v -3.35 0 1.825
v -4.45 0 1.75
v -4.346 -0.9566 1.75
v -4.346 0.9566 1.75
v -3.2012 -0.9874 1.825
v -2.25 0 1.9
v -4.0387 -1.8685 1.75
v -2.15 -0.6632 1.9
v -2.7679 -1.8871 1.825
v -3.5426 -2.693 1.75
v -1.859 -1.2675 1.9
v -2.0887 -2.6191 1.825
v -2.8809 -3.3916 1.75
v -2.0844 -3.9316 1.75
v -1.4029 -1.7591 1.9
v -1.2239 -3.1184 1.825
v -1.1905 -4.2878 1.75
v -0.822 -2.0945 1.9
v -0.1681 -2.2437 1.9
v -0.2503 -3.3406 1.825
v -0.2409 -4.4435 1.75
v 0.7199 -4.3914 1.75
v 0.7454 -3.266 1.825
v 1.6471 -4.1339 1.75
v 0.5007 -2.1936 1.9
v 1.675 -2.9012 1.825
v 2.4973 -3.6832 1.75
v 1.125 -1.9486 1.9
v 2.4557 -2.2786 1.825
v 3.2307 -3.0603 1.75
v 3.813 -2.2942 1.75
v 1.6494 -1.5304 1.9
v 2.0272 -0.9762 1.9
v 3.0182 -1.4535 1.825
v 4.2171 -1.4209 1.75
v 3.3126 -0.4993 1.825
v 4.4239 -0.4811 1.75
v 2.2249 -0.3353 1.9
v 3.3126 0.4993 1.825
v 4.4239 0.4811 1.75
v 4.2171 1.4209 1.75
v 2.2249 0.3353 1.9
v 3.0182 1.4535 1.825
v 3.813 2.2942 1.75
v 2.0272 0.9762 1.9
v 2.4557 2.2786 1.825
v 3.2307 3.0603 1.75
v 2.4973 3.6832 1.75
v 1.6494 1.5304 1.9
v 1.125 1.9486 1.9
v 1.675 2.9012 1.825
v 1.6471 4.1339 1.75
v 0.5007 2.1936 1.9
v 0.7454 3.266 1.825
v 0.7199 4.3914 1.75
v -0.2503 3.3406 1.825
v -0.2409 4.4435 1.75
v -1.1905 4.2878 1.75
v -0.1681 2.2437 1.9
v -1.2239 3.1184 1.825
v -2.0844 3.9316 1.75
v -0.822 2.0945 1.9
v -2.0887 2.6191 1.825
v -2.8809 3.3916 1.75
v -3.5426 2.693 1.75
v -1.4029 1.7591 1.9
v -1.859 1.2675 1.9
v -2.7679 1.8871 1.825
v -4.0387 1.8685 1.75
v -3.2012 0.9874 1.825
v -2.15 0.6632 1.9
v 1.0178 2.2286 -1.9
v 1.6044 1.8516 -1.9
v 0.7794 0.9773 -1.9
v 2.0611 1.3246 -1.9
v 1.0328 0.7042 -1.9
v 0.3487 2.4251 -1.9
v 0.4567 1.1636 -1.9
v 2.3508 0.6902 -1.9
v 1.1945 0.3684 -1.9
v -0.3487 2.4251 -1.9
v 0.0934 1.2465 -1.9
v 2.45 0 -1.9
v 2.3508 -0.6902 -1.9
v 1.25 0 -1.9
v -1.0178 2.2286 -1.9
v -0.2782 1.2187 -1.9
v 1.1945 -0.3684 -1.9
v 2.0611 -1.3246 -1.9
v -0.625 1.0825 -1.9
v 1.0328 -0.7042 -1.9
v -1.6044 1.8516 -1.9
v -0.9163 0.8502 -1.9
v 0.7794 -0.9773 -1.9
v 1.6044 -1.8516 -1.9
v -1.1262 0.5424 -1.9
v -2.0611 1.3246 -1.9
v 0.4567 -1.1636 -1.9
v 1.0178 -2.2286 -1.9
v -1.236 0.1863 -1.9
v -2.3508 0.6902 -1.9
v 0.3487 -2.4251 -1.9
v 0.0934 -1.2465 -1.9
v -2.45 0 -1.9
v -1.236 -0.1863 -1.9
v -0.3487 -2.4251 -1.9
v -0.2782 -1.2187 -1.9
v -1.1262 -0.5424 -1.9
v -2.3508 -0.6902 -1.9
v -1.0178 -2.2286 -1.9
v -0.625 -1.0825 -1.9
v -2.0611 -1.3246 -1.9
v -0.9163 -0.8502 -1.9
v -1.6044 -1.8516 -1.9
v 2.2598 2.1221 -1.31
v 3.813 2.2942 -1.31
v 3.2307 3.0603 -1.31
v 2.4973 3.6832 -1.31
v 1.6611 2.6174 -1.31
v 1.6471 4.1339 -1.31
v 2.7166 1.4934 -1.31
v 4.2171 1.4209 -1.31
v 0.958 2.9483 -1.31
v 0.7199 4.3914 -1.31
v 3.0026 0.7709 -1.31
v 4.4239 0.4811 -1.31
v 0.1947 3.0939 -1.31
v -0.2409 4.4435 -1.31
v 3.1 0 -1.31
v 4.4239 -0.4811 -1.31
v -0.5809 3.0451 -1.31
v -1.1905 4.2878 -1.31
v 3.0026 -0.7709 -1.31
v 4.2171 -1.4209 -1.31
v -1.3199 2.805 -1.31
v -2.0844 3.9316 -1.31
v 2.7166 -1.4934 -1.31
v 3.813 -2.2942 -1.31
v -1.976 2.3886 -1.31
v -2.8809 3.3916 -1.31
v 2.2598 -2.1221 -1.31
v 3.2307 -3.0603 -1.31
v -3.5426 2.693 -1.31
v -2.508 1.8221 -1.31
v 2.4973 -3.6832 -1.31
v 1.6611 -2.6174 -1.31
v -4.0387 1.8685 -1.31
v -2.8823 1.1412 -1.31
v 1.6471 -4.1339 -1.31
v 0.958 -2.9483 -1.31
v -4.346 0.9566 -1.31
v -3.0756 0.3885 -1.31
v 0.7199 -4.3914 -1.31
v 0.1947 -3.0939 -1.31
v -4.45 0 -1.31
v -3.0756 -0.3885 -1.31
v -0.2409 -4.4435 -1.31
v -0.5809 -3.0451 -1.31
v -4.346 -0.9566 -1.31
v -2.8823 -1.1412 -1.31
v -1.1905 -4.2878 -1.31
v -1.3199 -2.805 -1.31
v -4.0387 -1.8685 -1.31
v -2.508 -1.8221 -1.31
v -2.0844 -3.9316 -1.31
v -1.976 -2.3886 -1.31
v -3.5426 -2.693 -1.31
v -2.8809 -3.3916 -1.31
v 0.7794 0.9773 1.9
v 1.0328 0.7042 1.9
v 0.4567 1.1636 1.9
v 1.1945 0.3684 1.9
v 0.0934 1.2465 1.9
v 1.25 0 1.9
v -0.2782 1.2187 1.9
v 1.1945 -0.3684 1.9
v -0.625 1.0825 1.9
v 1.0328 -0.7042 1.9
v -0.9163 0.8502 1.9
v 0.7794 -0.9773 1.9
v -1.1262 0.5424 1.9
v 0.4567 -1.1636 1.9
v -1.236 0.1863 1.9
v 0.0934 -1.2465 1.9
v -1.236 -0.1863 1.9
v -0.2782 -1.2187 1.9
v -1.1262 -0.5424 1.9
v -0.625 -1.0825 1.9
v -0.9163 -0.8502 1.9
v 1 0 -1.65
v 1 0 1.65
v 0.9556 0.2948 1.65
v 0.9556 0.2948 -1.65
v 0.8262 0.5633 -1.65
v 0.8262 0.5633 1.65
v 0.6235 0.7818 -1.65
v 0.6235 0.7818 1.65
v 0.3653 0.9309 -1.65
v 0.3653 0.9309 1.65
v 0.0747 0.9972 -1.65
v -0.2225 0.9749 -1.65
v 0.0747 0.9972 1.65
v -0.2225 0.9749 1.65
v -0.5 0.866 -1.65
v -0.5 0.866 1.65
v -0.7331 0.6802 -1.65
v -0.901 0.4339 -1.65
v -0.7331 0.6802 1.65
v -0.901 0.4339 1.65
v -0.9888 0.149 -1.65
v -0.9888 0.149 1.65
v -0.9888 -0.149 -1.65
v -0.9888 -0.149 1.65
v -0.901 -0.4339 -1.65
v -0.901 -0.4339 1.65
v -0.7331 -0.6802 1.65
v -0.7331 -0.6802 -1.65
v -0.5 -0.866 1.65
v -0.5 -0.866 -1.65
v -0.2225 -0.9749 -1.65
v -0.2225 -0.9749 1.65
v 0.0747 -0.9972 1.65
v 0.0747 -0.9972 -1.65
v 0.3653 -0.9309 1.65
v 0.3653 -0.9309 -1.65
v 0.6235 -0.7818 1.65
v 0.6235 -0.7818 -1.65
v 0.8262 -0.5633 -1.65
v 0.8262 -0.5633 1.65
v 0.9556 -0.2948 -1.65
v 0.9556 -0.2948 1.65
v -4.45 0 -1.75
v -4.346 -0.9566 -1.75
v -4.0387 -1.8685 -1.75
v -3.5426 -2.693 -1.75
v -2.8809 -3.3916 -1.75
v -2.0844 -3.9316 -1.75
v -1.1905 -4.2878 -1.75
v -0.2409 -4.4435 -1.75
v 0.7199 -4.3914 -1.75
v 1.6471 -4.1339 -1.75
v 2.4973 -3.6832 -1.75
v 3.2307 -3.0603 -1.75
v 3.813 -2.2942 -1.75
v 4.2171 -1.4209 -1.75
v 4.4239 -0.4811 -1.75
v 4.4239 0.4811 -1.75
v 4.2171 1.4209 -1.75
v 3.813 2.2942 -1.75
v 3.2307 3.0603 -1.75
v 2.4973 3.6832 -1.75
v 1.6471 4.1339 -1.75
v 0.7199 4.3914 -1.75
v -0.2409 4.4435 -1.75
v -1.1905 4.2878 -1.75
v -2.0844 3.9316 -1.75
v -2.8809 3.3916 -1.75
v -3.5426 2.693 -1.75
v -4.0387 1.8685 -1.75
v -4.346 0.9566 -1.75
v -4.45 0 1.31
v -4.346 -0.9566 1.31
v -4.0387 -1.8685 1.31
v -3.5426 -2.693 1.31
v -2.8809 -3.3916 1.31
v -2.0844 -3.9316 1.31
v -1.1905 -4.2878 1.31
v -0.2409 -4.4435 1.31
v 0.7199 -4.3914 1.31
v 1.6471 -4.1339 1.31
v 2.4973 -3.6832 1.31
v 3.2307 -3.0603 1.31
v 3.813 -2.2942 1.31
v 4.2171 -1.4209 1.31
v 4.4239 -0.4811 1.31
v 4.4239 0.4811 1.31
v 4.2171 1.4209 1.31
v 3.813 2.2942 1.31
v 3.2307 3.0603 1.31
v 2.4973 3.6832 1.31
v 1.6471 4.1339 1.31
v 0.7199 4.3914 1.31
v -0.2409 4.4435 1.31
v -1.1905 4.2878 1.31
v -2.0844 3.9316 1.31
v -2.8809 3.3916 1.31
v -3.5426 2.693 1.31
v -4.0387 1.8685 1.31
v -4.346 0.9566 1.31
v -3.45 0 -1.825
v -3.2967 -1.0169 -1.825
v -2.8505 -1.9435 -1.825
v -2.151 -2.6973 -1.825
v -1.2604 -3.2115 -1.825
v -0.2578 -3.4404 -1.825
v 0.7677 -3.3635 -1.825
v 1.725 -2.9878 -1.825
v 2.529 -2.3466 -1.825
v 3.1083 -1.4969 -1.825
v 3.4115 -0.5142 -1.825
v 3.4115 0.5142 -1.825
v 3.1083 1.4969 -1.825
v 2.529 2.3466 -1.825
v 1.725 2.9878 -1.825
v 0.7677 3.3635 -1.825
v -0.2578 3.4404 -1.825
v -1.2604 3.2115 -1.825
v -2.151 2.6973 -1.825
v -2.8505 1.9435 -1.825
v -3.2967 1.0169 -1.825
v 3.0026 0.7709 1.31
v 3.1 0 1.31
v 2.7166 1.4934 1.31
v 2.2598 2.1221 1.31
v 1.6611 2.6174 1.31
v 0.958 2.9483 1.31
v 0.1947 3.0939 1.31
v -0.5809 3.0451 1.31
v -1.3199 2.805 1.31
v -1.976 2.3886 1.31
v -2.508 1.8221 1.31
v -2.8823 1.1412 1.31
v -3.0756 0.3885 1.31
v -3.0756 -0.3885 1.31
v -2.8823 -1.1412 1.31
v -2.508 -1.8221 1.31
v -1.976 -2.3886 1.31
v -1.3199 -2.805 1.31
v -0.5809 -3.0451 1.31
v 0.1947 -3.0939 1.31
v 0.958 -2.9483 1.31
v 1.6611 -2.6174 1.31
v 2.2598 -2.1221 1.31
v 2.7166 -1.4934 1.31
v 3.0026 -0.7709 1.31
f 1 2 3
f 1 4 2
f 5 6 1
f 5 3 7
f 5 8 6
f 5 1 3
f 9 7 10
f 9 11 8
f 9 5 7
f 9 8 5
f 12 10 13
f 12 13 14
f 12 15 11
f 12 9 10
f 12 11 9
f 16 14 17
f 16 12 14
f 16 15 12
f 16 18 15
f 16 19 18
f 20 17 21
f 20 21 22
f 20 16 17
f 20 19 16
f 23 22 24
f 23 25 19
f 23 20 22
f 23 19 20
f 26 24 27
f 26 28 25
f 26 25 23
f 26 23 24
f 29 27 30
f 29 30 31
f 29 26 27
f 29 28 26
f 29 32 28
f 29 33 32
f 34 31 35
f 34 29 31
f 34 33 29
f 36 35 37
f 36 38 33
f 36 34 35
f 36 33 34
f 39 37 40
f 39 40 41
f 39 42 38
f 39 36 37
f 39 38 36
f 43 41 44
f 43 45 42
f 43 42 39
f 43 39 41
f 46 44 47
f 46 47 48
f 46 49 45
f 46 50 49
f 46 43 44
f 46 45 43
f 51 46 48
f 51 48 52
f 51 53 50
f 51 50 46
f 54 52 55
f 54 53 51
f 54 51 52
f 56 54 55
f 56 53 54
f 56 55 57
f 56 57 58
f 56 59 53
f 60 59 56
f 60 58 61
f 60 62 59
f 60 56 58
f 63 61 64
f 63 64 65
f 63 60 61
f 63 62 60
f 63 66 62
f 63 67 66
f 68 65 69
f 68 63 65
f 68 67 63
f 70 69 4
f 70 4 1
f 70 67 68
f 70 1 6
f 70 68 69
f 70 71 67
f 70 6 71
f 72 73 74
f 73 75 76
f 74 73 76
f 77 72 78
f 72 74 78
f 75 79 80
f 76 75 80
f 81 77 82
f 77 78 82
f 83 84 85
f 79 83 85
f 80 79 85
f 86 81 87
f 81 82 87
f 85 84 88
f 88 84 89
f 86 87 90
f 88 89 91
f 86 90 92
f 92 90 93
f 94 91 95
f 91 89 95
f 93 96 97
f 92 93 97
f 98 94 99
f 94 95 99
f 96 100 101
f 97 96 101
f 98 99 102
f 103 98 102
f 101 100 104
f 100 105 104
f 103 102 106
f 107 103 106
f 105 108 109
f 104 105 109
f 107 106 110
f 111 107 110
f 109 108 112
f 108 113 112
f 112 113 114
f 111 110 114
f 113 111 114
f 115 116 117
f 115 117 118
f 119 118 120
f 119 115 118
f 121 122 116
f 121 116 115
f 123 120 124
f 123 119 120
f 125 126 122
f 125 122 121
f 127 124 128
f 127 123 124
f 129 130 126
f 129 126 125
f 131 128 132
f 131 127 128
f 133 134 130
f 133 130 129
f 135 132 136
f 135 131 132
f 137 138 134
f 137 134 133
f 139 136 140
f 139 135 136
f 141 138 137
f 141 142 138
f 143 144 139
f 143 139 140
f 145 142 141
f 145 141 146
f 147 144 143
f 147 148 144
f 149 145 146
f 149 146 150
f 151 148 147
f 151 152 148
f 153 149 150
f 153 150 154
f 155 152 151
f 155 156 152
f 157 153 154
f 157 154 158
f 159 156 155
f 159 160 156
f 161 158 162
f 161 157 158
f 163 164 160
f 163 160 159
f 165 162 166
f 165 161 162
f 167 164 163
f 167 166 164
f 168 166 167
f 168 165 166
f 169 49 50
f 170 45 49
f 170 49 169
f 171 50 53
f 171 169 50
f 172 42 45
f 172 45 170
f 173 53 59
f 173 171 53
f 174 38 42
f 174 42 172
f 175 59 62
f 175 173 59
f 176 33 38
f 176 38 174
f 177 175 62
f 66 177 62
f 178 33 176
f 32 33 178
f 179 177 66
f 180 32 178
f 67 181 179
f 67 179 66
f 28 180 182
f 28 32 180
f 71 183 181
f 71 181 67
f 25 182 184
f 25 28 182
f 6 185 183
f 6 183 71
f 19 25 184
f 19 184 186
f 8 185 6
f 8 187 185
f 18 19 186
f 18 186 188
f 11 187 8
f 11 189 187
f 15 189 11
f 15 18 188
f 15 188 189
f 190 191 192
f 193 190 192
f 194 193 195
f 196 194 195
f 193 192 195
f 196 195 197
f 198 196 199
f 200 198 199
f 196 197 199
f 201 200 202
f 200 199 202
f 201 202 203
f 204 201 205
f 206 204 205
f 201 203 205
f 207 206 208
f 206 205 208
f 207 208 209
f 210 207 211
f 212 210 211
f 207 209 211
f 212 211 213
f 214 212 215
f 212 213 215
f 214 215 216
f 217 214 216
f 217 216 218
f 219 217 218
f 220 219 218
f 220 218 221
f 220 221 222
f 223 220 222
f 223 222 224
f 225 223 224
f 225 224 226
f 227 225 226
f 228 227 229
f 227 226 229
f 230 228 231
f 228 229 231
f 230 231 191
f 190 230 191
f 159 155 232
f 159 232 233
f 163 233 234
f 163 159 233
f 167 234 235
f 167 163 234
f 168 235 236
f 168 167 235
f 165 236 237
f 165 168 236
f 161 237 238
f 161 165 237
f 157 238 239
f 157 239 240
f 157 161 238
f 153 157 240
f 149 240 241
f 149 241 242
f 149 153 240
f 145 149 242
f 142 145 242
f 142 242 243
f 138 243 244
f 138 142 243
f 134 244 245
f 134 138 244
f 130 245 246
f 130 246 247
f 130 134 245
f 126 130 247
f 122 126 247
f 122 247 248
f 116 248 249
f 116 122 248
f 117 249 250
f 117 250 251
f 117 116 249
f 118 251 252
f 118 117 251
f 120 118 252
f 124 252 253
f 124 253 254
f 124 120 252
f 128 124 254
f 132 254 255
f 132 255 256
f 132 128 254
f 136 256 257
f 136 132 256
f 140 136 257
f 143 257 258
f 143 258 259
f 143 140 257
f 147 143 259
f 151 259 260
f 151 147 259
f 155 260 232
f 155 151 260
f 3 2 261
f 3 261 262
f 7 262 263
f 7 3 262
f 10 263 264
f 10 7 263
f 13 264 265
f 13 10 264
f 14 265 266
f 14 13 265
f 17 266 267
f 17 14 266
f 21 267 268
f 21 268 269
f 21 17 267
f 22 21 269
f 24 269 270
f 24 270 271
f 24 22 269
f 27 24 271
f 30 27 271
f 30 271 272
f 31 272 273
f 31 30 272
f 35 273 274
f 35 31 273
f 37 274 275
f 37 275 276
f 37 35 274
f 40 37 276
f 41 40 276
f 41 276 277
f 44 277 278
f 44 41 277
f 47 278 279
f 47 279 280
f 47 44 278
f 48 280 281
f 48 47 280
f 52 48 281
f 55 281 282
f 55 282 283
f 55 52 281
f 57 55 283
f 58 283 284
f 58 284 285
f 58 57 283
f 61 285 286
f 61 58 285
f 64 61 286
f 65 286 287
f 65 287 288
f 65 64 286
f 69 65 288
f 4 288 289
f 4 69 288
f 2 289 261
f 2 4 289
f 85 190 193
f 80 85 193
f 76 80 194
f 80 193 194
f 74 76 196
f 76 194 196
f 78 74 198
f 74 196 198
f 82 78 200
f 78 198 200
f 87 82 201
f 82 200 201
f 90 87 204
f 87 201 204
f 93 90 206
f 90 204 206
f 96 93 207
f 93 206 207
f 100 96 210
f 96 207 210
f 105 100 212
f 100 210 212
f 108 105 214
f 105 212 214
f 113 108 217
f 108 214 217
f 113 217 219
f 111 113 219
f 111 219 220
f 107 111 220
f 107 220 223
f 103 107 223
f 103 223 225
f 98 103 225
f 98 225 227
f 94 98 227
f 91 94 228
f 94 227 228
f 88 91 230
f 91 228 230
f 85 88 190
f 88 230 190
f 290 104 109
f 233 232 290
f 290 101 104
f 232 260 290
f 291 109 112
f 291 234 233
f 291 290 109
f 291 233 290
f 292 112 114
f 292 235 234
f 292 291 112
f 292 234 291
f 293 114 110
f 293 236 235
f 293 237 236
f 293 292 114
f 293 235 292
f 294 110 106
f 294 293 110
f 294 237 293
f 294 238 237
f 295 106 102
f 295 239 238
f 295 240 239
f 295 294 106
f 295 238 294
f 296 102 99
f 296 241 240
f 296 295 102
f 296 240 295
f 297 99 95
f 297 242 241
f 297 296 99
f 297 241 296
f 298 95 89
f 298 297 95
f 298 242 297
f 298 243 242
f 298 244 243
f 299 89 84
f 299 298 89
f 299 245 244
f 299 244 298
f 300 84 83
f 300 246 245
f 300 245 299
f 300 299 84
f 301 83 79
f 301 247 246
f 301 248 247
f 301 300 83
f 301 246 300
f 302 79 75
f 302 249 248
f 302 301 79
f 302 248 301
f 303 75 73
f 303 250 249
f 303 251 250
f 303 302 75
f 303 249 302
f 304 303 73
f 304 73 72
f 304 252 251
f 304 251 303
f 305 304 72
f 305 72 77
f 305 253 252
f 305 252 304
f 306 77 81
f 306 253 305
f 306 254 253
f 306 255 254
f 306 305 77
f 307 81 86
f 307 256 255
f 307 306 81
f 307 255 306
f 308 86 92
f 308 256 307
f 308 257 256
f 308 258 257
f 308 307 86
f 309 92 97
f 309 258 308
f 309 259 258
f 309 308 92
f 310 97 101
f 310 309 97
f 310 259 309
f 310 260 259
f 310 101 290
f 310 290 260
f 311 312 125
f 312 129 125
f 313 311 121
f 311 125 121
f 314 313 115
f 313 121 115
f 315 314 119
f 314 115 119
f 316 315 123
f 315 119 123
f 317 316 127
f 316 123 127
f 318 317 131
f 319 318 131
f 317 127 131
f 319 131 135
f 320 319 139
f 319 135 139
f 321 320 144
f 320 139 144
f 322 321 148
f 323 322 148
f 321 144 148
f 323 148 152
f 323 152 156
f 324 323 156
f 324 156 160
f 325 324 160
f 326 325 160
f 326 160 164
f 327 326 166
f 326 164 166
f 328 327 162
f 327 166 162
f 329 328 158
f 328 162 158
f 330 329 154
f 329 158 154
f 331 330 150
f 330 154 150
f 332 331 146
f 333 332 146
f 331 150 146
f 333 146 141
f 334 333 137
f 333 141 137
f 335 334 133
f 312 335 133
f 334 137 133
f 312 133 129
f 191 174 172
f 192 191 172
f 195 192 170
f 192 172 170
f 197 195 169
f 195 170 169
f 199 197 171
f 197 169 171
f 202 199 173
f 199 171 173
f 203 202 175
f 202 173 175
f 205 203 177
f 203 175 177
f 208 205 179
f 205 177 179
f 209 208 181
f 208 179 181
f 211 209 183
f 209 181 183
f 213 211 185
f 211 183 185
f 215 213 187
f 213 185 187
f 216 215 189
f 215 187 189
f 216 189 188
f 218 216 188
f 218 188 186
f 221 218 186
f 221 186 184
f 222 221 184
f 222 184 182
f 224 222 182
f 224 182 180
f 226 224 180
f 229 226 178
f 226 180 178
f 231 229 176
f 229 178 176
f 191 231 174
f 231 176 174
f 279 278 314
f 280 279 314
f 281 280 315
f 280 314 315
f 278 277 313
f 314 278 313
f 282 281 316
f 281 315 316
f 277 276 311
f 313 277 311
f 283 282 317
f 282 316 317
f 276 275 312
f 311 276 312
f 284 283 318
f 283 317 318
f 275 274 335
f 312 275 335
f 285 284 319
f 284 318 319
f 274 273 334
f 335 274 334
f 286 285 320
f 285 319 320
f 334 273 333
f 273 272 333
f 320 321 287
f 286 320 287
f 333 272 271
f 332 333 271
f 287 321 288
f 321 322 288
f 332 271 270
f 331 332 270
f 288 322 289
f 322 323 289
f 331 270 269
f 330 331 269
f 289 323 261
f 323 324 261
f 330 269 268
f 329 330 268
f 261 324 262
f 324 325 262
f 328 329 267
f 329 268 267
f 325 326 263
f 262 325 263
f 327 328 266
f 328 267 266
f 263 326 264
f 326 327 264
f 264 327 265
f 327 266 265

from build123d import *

# Parameters (mm, degrees)
SKETCH_1_R          = 4.45
EXTRUDE_1_DEPTH     = 1.9
SKETCH_2_R          = 4.45
SKETCH_2_R_2        = 3.1
CUT_EXTRUDE_2_DEPTH = 1.31
SKETCH_3_R          = 1
CUT_EXTRUDE_3_DEPTH = 3.8
CHAMFER_1_SIZE      = 0.25
CHAMFER_2_SIZE      = 2
CHAMFER_2_SIZE2     = 0.15
CHAMFER_3_SIZE      = 0.15
CHAMFER_3_SIZE2     = 2.2


with BuildPart() as part:
    # 草图1 → 拉伸1 (new, symmetric)
    with BuildSketch(Plane.XY):
        with Locations(Location((0, 0, 0), (0, 0, 180))):
            Circle(SKETCH_1_R)
    extrude(amount=EXTRUDE_1_DEPTH, both=True)

    # 草图2 → 拉伸2 (cut, symmetric)
    with BuildSketch(Plane.XY):
        with Locations(Location((0, 0, 0), (0, 0, 180))):
            Circle(SKETCH_2_R)
        Circle(SKETCH_2_R_2, mode=Mode.SUBTRACT)
    extrude(amount=CUT_EXTRUDE_2_DEPTH, both=True, mode=Mode.SUBTRACT)

    # 草图3 → 拉伸3 (cut)
    with BuildSketch(Plane.XY.offset(1.9)):
        Circle(SKETCH_3_R)
    extrude(amount=-CUT_EXTRUDE_3_DEPTH, mode=Mode.SUBTRACT)

    # 倒角1
    chamfer_1_edges = [part.edges().sort_by_distance(p)[0] for p in [
        (-1, 0, 1.9),
        (-1, 0, -1.9),
    ]]
    chamfer(chamfer_1_edges, length=CHAMFER_1_SIZE)

    # 倒角2
    chamfer_2_edges = [part.edges().sort_by_distance(p)[0] for p in [
        (4.45, 0, -1.9),
    ]]
    chamfer_2_side = [part.faces().sort_by_distance(p)[0] for p in [
        (-1.375865007, 0, -1.9),
    ]]
    chamfer(chamfer_2_edges, length=CHAMFER_2_SIZE, length2=CHAMFER_2_SIZE2, reference=chamfer_2_side[0])

    # 倒角3
    chamfer_3_edges = [part.edges().sort_by_distance(p)[0] for p in [
        (4.45, 0, 1.9),
    ]]
    chamfer_3_side = [part.faces().sort_by_distance(p)[0] for p in [
        (4.45, 0, 1.605),
    ]]
    chamfer(chamfer_3_edges, length=CHAMFER_3_SIZE, length2=CHAMFER_3_SIZE2, reference=chamfer_3_side[0])


solid = part.part
